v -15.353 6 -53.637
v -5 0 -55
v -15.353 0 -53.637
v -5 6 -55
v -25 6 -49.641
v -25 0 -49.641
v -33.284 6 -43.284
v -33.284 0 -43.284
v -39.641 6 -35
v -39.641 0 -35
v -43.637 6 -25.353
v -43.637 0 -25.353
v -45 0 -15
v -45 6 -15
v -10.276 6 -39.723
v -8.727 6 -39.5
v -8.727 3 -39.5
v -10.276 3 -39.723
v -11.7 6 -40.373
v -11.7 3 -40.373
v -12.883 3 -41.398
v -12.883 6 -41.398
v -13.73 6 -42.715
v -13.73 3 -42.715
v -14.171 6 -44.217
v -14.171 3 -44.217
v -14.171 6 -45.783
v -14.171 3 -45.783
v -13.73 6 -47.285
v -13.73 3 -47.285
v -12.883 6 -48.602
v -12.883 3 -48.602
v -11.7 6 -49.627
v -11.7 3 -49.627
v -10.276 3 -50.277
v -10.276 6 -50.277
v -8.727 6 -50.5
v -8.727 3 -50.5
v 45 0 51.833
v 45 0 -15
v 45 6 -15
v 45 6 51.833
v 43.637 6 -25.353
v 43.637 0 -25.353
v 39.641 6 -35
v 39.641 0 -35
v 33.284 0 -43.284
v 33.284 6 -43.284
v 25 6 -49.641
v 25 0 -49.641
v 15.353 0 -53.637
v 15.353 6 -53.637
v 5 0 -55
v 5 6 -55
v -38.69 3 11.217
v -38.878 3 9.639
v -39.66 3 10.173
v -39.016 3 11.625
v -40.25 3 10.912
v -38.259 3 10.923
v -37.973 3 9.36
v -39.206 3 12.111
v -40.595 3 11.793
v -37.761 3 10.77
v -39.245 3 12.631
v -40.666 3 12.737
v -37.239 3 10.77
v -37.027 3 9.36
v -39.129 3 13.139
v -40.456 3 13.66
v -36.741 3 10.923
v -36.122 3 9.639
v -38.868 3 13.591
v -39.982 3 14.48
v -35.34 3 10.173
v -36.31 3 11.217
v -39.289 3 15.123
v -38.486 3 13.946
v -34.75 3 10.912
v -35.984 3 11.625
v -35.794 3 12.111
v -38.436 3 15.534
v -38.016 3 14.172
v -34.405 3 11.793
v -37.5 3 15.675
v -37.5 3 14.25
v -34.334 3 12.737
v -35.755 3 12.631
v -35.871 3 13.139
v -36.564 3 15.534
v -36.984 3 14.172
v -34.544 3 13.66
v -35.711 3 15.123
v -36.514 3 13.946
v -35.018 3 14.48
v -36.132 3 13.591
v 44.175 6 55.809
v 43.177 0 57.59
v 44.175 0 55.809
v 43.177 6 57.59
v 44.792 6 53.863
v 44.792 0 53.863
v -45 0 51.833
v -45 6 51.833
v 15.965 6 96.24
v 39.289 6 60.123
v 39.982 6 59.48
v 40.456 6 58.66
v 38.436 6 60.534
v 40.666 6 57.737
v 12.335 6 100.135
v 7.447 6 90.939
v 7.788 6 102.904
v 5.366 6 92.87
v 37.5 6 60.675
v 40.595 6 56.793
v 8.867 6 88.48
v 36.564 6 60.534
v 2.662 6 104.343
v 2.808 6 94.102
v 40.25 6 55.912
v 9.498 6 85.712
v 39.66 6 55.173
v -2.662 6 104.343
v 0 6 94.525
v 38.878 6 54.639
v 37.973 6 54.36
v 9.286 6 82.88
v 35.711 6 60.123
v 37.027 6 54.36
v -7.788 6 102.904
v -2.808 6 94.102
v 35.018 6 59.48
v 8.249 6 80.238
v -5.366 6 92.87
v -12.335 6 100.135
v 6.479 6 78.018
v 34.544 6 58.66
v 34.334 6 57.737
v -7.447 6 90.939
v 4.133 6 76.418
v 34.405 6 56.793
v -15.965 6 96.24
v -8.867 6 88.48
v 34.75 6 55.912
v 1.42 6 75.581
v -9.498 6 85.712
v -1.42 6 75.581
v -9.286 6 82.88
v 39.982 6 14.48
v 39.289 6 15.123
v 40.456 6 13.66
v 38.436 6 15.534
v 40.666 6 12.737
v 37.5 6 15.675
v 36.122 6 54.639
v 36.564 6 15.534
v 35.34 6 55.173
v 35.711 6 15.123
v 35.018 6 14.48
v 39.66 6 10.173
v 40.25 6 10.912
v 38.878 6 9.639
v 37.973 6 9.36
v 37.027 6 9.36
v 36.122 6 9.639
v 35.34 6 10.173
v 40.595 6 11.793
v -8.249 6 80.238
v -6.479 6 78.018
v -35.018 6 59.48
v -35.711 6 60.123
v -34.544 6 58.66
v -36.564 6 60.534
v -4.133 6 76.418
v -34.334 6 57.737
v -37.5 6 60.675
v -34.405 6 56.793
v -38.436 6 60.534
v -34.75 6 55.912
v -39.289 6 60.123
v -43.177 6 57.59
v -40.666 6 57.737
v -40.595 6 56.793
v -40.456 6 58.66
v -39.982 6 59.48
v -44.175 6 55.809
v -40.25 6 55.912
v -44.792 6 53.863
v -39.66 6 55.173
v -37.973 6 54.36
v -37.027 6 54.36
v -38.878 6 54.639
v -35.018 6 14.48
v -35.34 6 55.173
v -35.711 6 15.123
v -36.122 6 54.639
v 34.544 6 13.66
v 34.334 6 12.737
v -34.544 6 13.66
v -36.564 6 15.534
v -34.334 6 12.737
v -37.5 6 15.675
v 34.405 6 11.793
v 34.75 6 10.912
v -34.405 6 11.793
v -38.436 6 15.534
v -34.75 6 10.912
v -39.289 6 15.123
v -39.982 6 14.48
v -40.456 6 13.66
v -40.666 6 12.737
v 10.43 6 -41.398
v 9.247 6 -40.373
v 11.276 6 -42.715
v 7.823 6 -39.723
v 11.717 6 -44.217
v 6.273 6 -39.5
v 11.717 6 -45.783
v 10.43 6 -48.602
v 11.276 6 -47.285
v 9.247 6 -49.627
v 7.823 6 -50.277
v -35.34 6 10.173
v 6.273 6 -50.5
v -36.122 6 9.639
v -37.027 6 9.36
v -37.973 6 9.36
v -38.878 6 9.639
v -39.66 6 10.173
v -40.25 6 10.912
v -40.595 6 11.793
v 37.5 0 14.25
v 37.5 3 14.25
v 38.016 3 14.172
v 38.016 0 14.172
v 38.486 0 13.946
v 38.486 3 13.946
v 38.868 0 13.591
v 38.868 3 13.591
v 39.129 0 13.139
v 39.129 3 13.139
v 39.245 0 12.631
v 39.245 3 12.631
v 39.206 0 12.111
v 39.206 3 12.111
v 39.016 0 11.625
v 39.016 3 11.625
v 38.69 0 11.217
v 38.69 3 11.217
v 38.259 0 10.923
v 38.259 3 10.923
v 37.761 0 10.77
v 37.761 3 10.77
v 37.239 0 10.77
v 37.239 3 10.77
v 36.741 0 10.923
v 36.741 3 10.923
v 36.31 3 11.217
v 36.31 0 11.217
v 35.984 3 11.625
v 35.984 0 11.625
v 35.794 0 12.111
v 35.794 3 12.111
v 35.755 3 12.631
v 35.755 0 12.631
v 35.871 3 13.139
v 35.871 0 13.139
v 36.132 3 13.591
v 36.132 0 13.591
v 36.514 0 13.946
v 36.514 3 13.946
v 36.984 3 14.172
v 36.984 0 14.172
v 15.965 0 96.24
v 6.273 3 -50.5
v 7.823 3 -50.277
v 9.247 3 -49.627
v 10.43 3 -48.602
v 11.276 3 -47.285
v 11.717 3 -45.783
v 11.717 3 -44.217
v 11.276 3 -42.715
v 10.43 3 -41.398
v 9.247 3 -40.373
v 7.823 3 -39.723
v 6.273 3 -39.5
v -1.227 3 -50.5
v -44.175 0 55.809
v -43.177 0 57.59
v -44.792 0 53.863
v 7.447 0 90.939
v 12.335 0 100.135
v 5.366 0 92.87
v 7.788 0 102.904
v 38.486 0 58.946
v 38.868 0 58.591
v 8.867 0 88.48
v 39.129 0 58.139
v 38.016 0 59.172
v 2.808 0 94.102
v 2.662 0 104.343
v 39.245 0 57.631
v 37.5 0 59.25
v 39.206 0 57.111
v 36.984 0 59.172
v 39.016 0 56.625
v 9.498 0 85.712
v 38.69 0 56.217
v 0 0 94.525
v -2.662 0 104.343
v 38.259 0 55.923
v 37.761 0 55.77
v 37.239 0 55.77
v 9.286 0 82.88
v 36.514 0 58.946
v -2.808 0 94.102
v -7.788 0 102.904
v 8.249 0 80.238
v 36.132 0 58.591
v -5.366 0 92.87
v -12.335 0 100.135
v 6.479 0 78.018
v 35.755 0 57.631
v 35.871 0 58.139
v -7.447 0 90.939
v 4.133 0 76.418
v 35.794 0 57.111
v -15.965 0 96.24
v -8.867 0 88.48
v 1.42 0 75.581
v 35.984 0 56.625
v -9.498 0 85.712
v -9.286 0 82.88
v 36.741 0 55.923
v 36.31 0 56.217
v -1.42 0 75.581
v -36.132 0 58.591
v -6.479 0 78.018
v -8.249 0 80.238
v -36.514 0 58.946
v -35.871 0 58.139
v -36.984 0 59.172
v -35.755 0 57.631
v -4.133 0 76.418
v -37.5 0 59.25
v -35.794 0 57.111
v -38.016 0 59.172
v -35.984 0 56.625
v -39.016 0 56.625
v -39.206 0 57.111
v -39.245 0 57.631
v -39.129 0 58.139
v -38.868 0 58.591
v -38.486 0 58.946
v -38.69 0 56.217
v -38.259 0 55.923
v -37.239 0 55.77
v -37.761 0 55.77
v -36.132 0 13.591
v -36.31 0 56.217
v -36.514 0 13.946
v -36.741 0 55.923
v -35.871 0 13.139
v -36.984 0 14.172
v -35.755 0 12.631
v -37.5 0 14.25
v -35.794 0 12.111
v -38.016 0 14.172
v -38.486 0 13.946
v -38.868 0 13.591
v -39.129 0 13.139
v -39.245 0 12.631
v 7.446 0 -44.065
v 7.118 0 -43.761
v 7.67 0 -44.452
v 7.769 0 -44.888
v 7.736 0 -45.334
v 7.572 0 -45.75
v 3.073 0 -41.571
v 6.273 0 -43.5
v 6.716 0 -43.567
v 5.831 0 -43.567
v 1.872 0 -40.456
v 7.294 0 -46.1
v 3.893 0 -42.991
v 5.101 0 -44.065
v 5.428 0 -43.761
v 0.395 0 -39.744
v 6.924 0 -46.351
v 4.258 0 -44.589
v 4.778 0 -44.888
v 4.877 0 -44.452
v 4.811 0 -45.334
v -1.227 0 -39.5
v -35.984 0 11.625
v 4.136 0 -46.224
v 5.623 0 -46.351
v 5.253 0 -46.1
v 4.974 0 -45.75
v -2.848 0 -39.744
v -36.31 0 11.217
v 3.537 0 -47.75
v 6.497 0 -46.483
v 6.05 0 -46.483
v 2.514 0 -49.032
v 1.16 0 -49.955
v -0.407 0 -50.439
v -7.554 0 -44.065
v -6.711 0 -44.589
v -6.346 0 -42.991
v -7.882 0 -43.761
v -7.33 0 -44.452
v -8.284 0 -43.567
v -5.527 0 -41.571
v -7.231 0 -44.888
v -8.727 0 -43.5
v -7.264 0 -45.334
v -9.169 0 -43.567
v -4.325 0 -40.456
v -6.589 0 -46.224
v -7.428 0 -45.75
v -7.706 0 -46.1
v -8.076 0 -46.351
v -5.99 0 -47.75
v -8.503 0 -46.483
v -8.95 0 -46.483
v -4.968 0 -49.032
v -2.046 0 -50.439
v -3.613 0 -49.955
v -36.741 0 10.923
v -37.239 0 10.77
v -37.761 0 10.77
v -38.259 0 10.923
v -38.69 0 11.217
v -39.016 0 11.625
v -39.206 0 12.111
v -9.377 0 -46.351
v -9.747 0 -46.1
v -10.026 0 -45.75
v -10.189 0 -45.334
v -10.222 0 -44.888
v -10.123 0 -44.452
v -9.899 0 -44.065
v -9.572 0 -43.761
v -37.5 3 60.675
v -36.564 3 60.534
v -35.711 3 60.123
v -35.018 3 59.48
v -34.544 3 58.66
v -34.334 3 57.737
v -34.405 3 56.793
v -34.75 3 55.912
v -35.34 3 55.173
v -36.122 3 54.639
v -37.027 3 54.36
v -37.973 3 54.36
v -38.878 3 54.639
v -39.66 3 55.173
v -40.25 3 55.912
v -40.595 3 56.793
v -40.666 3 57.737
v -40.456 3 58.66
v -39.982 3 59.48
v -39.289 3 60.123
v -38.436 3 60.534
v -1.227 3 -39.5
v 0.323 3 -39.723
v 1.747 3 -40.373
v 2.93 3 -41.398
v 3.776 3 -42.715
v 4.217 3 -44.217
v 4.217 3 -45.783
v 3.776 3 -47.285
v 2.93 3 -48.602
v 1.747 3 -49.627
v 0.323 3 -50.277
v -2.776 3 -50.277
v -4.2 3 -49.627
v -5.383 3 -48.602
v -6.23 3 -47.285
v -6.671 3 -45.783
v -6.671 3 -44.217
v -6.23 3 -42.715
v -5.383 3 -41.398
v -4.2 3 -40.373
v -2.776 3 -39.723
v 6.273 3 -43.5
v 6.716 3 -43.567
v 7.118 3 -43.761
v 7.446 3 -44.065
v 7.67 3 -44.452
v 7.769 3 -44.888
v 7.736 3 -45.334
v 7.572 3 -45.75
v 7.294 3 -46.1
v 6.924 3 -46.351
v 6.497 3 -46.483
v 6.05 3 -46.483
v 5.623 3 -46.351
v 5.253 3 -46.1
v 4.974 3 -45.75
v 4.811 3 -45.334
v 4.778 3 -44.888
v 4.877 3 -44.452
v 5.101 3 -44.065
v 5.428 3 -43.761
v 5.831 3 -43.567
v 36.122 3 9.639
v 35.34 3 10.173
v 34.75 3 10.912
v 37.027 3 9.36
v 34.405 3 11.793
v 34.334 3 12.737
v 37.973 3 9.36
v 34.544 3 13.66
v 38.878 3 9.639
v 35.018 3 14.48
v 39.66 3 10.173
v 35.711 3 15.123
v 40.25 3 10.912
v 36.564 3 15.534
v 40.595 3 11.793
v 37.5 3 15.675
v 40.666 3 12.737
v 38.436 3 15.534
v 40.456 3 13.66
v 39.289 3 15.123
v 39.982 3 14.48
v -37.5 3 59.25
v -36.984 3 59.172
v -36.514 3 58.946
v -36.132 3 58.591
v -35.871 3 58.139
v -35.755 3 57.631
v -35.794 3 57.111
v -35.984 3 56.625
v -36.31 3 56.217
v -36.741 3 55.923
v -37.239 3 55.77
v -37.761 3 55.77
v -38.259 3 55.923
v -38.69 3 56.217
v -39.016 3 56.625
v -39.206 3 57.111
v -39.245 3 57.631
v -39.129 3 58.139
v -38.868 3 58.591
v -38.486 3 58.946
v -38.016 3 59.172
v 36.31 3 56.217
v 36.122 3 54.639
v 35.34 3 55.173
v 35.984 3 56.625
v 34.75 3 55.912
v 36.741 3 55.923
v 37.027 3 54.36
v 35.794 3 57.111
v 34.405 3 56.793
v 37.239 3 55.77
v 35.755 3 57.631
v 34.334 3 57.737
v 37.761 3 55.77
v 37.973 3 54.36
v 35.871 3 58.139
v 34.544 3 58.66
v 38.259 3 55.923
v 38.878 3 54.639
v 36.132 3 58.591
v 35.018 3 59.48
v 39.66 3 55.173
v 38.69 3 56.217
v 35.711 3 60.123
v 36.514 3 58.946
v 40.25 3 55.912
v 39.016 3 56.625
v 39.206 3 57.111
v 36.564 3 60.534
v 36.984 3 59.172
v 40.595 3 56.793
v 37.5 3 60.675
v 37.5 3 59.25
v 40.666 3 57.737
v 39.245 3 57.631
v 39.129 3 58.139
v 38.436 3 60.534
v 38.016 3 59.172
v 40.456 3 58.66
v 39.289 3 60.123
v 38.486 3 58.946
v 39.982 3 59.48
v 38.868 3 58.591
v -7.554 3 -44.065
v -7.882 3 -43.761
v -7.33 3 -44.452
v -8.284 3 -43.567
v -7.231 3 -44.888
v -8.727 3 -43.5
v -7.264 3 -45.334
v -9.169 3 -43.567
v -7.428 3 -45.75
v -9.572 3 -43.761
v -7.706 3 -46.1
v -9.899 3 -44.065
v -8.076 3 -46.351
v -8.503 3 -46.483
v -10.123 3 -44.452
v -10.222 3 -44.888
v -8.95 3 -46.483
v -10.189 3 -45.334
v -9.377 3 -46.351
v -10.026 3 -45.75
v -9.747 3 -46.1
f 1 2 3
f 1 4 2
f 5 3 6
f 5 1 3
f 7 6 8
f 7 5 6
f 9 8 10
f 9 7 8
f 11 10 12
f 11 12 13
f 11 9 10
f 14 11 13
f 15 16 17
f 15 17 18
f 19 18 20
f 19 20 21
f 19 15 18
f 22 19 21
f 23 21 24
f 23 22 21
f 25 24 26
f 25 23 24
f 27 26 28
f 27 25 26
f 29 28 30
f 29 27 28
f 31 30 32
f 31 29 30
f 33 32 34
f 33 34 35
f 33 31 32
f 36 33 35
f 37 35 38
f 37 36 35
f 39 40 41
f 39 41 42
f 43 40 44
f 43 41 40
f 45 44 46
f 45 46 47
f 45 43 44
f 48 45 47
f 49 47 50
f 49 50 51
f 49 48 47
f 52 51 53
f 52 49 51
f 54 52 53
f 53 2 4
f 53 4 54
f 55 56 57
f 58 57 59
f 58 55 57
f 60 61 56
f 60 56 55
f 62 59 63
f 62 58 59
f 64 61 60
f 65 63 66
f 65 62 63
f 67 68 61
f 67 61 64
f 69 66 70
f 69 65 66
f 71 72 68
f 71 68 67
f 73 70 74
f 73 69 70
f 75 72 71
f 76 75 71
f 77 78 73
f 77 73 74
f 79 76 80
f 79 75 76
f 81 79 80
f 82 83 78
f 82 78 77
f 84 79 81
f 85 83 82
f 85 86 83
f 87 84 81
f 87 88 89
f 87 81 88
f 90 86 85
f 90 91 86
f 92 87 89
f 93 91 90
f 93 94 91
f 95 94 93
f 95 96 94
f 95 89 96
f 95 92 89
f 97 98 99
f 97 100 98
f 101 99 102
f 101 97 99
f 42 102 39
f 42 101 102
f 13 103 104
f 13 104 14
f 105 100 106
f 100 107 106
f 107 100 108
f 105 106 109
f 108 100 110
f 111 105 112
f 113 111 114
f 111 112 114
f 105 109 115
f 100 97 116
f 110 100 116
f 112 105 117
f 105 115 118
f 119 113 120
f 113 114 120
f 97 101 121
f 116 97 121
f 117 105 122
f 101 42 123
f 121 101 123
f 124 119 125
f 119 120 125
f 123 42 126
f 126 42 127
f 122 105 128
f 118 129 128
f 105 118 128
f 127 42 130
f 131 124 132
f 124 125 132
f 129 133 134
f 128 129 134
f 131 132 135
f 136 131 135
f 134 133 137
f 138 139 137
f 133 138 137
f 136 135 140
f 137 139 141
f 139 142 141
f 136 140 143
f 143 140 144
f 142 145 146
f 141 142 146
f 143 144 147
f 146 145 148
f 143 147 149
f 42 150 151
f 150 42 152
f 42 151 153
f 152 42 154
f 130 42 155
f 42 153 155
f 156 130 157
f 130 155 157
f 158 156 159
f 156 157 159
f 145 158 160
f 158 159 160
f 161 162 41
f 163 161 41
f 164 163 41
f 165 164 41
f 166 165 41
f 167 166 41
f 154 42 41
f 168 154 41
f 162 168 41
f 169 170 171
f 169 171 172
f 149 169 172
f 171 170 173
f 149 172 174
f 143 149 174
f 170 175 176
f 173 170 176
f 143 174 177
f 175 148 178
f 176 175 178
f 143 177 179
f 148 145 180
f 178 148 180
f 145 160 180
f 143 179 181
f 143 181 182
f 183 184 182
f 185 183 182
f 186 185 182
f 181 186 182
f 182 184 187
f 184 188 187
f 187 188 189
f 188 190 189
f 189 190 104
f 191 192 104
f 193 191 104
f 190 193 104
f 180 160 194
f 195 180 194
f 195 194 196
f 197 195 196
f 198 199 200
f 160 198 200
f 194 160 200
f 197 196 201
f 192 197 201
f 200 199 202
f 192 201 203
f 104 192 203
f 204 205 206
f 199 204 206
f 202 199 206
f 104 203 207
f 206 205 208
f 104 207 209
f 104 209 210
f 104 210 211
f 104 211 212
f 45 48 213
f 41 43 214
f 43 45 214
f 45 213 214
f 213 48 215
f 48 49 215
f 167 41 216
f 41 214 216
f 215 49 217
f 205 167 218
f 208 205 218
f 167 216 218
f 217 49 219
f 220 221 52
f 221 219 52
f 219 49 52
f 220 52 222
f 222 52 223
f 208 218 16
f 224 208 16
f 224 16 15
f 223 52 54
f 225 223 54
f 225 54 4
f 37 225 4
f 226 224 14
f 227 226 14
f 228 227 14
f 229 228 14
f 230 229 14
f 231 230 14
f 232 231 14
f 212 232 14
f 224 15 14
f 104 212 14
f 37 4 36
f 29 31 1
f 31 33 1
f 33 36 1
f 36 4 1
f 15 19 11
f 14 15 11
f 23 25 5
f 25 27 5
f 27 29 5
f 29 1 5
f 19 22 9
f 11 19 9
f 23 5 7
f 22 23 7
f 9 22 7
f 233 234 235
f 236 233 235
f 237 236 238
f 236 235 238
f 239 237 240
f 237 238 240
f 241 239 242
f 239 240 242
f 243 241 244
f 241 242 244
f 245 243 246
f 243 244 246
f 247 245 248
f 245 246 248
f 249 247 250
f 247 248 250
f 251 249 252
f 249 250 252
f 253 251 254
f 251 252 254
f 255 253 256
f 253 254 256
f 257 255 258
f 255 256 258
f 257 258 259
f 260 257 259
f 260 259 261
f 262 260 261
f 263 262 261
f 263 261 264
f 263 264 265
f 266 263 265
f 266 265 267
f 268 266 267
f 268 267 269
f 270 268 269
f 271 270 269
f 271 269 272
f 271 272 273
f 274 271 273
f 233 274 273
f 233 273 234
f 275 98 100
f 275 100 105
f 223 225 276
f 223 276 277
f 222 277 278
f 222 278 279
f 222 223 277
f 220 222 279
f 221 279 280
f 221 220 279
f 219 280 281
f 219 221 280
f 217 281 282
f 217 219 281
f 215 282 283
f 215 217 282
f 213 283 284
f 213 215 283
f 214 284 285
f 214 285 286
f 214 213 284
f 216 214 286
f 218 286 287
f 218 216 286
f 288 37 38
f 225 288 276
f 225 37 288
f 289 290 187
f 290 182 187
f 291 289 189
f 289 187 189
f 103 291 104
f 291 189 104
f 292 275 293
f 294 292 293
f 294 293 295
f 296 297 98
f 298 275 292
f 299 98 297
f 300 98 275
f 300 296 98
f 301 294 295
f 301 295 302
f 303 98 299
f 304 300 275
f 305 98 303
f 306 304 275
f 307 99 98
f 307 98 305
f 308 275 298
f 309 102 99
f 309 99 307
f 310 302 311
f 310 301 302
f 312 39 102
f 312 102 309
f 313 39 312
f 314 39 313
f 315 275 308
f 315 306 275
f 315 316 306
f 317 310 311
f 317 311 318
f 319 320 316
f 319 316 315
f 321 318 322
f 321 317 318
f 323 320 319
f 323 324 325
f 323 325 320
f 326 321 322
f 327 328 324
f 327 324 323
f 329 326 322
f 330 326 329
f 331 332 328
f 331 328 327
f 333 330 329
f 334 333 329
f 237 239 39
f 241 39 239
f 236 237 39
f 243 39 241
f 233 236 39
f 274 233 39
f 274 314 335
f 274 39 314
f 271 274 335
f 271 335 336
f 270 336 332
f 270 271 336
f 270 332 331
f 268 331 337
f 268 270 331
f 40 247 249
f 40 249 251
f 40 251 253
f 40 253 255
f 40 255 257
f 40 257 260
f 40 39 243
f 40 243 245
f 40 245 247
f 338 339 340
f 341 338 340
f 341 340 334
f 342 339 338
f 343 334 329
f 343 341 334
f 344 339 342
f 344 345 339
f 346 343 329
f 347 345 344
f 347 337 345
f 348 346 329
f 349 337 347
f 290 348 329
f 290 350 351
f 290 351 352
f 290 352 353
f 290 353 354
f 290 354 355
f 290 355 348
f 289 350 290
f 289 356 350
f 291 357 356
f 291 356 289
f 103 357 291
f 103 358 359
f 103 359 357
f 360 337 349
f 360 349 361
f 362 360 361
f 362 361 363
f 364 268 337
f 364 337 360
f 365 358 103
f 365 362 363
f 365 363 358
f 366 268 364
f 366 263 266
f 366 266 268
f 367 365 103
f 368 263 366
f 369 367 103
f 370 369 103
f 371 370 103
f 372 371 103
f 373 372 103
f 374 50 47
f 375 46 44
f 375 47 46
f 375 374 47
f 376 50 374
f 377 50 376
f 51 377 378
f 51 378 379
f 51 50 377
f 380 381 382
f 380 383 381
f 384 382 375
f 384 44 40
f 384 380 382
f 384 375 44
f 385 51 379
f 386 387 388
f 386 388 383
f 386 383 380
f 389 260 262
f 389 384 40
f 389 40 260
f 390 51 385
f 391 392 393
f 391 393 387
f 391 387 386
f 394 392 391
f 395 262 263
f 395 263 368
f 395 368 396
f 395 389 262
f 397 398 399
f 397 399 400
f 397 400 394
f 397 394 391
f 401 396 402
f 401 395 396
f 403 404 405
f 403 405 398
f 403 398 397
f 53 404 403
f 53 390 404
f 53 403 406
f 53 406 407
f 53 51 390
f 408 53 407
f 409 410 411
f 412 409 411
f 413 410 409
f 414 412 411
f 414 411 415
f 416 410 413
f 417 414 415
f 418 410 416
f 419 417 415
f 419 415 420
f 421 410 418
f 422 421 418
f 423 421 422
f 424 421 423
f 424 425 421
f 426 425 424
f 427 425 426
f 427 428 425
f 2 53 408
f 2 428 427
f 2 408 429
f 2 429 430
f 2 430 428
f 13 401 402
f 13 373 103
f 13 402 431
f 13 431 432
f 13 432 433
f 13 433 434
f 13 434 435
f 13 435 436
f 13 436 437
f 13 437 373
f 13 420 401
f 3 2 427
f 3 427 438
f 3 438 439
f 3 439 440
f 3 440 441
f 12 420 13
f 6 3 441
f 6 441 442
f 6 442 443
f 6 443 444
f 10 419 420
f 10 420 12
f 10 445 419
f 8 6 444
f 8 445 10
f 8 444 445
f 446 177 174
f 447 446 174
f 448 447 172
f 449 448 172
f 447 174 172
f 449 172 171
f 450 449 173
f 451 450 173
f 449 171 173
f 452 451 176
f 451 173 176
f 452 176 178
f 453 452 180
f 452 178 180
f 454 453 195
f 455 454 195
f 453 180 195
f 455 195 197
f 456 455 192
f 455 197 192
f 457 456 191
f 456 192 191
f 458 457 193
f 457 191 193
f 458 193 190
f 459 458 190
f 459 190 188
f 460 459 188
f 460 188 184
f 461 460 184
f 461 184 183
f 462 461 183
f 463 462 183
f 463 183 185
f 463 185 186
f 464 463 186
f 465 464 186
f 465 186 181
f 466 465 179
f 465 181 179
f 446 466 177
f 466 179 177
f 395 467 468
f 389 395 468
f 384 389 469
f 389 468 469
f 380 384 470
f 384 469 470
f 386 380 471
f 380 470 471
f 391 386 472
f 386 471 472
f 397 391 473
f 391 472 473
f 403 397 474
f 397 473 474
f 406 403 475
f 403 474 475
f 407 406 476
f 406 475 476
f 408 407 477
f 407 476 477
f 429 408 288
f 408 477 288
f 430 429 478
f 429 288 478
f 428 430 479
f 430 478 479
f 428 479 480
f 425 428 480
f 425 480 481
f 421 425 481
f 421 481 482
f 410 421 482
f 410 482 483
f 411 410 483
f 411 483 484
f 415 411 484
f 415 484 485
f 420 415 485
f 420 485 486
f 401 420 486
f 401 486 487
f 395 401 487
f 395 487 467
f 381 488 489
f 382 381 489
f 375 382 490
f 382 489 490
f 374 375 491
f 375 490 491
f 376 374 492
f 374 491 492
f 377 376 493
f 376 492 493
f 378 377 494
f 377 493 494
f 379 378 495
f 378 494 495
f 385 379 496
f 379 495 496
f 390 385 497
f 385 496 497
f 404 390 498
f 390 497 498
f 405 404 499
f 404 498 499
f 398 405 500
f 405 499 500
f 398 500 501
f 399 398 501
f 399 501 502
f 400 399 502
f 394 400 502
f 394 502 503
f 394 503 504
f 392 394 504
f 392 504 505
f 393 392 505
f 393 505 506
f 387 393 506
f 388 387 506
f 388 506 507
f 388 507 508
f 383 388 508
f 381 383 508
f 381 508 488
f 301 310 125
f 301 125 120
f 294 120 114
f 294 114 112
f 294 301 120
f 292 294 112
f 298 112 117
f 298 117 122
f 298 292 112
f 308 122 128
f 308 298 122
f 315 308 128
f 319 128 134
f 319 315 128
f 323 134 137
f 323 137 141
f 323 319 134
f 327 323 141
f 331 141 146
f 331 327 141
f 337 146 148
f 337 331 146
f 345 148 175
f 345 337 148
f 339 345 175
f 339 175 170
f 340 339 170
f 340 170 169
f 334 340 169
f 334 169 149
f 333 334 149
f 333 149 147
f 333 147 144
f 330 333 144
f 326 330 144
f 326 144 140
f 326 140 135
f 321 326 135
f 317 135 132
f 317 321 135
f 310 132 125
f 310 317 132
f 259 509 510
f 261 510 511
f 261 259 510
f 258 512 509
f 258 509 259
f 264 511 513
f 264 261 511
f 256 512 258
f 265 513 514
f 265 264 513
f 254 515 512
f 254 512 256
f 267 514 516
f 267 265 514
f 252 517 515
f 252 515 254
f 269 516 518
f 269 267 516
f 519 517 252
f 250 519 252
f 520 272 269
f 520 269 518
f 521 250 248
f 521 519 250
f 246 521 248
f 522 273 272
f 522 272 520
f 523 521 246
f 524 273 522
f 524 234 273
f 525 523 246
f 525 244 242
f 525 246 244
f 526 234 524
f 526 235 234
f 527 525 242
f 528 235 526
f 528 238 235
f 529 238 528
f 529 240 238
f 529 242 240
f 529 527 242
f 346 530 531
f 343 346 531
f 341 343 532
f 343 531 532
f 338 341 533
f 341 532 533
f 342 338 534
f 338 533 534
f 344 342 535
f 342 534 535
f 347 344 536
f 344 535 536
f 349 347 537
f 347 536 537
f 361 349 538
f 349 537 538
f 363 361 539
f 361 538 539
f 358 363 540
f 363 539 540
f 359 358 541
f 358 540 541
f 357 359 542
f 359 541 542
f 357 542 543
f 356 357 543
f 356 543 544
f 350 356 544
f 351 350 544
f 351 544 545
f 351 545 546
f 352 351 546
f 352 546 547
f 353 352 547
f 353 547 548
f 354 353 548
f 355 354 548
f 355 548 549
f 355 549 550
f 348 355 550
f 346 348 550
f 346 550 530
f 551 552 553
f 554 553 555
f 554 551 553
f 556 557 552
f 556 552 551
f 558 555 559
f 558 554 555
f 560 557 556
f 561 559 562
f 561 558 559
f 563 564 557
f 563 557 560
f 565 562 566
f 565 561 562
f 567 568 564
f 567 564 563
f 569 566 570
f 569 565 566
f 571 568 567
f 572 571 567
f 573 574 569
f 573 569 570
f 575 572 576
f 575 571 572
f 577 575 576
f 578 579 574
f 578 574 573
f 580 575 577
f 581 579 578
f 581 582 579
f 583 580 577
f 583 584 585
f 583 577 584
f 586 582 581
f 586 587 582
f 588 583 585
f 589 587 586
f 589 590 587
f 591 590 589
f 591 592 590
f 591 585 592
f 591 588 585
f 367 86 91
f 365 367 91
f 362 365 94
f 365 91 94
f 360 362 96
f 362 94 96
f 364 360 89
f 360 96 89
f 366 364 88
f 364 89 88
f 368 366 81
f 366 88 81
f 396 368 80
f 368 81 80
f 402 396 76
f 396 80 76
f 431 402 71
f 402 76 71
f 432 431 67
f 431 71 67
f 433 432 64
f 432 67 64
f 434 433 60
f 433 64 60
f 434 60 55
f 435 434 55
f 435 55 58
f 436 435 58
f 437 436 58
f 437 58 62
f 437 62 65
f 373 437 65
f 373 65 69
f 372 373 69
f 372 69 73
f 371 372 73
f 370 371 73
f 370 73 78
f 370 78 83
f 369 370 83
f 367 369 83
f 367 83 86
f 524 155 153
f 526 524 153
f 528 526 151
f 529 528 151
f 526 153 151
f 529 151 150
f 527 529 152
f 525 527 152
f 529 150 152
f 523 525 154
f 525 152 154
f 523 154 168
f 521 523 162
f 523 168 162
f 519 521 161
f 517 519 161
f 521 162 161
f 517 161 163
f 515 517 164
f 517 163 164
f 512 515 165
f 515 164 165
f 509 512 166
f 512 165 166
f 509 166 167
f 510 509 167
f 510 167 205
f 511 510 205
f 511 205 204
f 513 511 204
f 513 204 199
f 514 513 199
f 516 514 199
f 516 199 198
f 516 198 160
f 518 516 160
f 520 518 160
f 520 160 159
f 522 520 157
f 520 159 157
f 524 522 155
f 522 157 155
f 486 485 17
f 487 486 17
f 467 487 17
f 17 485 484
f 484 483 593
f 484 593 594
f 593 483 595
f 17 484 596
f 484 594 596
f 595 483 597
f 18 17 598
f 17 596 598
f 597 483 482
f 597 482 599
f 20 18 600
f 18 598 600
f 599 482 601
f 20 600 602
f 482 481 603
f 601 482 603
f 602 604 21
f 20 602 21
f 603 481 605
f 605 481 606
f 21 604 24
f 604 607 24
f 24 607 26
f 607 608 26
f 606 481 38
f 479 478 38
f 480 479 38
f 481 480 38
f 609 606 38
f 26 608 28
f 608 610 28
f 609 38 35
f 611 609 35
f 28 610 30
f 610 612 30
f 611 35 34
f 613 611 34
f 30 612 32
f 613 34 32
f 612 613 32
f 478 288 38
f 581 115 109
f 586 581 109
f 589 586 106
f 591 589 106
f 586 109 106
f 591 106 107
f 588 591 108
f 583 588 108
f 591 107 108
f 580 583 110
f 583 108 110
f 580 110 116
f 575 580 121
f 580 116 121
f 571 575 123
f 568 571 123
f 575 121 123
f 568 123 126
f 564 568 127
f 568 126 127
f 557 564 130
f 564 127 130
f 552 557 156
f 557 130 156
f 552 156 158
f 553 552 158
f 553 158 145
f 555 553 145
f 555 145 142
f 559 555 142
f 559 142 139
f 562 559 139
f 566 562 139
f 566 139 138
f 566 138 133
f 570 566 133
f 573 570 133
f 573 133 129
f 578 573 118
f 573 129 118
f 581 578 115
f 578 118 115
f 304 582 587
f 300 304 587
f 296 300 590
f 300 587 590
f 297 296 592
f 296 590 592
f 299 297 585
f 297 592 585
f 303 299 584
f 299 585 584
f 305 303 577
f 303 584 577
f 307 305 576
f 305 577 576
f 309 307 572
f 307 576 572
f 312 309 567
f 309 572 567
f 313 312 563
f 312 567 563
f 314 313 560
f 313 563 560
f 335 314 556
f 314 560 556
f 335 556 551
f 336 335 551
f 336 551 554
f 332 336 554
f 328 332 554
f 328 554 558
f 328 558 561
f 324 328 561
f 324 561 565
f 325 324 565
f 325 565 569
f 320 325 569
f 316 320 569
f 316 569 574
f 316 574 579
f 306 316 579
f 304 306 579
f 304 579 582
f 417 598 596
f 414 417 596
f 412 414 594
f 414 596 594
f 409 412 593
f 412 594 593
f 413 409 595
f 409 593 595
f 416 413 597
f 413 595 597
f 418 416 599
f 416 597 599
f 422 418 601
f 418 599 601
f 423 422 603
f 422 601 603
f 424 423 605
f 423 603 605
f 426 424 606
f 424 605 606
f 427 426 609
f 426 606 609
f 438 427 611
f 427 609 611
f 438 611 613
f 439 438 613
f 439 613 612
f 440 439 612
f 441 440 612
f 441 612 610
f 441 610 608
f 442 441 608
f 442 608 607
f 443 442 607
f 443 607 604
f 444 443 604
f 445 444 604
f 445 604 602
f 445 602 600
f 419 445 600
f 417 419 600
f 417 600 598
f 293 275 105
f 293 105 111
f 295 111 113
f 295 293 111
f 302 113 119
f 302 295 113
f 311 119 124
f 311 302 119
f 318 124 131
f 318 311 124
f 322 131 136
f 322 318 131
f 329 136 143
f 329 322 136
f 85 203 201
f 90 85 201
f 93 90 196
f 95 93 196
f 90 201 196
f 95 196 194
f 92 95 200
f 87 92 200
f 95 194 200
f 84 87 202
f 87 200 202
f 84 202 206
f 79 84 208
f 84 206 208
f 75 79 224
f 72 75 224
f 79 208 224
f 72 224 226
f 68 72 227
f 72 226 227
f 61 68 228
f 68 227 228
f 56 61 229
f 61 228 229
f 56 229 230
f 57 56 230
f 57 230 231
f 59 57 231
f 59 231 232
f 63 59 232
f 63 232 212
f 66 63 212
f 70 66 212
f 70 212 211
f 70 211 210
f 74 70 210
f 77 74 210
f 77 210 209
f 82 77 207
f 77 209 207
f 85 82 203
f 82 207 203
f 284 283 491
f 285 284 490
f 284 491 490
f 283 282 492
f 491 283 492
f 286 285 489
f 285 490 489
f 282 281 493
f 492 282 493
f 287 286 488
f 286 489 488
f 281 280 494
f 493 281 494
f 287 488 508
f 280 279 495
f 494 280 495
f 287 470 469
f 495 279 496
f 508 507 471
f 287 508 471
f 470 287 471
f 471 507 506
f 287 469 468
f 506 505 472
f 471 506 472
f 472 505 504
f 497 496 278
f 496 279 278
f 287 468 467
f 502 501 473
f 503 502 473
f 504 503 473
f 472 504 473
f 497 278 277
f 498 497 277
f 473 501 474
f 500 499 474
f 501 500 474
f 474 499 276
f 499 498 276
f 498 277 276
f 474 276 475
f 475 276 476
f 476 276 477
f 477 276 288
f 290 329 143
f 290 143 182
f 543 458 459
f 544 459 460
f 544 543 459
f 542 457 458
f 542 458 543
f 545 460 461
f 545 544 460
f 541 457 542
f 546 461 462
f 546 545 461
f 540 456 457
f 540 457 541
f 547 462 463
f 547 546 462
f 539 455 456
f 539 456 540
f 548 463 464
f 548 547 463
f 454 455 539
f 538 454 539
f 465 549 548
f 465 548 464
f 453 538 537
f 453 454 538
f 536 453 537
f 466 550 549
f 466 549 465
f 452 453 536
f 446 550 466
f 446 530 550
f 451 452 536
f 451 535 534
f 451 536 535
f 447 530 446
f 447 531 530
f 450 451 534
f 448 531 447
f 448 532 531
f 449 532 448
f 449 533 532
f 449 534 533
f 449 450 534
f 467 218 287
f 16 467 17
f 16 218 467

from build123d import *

# Parameters (mm, degrees)
SKETCH1_R          = 9.525
BODY_DEPTH         = 6
SKETCH2_R          = 1.5
SKETCH2_R_2        = 5.5
SKETCH2_R_3        = 1.75
HOLES_DEPTH        = 6
FILLET1_R          = 10
FILLET2_R          = 40
SKETCH3_R          = 3.175
CUT_EXTRUDE2_DEPTH = 3


with BuildPart() as part:
    # Sketch1 → Body (new body)
    with BuildSketch(Plane(origin=(0, 0, 0), x_dir=(1, 0, 0), z_dir=(0, 1, 0))):
        with BuildLine():
            Line((45, -55), (15.965110713, -96.240145236))
            ThreePointArc((15.965110713, -96.240145236), (0, -104.525), (-15.965110713, -96.240145236))
            Line((-15.965110713, -96.240145236), (-45, -55))
            Line((-45, -55), (-45, 55))
            Line((-45, 55), (45, 55))
            Line((45, 55), (45, -55))
        make_face()
        with Locations(Location((0, -85, 0), (0, 0, 270))):
            Circle(SKETCH1_R, mode=Mode.SUBTRACT)
    extrude(amount=BODY_DEPTH)

    # Sketch2 → Holes (cut)
    with BuildSketch(Plane(origin=(0, 6, 0), x_dir=(1, 0, 0), z_dir=(0, 1, 0))):
        with Locations(Location((6.273420837, 45, 0), (0, 0, 270))):
            Circle(SKETCH2_R)
        with Locations(Location((-8.726579163, 45, 0), (0, 0, 270))):
            Circle(SKETCH2_R)
        with Locations(Location((-1.226579163, 45, 0), (0, 0, 270))):
            Circle(SKETCH2_R_2)
        with Locations(Location((37.5, -57.5, 0), (0, 0, 270))):
            Circle(SKETCH2_R_3)
        with Locations(Location((-37.5, -57.5, 0), (0, 0, 270))):
            Circle(SKETCH2_R_3)
        with Locations(Location((-37.5, -12.5, 0), (0, 0, 270))):
            Circle(SKETCH2_R_3)
        with Locations(Location((37.5, -12.5, 0), (0, 0, 270))):
            Circle(SKETCH2_R_3)
    extrude(amount=-HOLES_DEPTH, mode=Mode.SUBTRACT)

    # Fillet1
    fillet1_edges = [part.edges().sort_by_distance(p)[0] for p in [
        (45, 3, 55),
        (-45, 3, 55),
    ]]
    fillet(fillet1_edges, radius=FILLET1_R)

    # Fillet2
    fillet2_edges = [part.edges().sort_by_distance(p)[0] for p in [
        (-45, 3, -55),
        (45, 3, -55),
    ]]
    fillet(fillet2_edges, radius=FILLET2_R)

    # Sketch3 → Cut-Extrude2 (cut)
    with BuildSketch(Plane(origin=(0, 6, 0), x_dir=(1, 0, 0), z_dir=(0, 1, 0))):
        with Locations(Location((-37.5, -12.5, 0), (0, 0, 270))):
            Circle(SKETCH3_R)
        with Locations(Location((37.5, -12.5, 0), (0, 0, 270))):
            Circle(SKETCH3_R)
        with Locations(Location((37.5, -57.5, 0), (0, 0, 270))):
            Circle(SKETCH3_R)
        with Locations(Location((-37.5, -57.5, 0), (0, 0, 270))):
            Circle(SKETCH3_R)
        with BuildLine():
            Line((-8.726579163, 50.5), (6.273420837, 50.5))
            ThreePointArc((6.273420837, 50.5), (11.773420837, 45), (6.273420837, 39.5))
            Line((6.273420837, 39.5), (-8.726579163, 39.5))
            ThreePointArc((-8.726579163, 39.5), (-14.226579163, 45), (-8.726579163, 50.5))
        make_face()
    extrude(amount=-CUT_EXTRUDE2_DEPTH, mode=Mode.SUBTRACT)


solid = part.part
